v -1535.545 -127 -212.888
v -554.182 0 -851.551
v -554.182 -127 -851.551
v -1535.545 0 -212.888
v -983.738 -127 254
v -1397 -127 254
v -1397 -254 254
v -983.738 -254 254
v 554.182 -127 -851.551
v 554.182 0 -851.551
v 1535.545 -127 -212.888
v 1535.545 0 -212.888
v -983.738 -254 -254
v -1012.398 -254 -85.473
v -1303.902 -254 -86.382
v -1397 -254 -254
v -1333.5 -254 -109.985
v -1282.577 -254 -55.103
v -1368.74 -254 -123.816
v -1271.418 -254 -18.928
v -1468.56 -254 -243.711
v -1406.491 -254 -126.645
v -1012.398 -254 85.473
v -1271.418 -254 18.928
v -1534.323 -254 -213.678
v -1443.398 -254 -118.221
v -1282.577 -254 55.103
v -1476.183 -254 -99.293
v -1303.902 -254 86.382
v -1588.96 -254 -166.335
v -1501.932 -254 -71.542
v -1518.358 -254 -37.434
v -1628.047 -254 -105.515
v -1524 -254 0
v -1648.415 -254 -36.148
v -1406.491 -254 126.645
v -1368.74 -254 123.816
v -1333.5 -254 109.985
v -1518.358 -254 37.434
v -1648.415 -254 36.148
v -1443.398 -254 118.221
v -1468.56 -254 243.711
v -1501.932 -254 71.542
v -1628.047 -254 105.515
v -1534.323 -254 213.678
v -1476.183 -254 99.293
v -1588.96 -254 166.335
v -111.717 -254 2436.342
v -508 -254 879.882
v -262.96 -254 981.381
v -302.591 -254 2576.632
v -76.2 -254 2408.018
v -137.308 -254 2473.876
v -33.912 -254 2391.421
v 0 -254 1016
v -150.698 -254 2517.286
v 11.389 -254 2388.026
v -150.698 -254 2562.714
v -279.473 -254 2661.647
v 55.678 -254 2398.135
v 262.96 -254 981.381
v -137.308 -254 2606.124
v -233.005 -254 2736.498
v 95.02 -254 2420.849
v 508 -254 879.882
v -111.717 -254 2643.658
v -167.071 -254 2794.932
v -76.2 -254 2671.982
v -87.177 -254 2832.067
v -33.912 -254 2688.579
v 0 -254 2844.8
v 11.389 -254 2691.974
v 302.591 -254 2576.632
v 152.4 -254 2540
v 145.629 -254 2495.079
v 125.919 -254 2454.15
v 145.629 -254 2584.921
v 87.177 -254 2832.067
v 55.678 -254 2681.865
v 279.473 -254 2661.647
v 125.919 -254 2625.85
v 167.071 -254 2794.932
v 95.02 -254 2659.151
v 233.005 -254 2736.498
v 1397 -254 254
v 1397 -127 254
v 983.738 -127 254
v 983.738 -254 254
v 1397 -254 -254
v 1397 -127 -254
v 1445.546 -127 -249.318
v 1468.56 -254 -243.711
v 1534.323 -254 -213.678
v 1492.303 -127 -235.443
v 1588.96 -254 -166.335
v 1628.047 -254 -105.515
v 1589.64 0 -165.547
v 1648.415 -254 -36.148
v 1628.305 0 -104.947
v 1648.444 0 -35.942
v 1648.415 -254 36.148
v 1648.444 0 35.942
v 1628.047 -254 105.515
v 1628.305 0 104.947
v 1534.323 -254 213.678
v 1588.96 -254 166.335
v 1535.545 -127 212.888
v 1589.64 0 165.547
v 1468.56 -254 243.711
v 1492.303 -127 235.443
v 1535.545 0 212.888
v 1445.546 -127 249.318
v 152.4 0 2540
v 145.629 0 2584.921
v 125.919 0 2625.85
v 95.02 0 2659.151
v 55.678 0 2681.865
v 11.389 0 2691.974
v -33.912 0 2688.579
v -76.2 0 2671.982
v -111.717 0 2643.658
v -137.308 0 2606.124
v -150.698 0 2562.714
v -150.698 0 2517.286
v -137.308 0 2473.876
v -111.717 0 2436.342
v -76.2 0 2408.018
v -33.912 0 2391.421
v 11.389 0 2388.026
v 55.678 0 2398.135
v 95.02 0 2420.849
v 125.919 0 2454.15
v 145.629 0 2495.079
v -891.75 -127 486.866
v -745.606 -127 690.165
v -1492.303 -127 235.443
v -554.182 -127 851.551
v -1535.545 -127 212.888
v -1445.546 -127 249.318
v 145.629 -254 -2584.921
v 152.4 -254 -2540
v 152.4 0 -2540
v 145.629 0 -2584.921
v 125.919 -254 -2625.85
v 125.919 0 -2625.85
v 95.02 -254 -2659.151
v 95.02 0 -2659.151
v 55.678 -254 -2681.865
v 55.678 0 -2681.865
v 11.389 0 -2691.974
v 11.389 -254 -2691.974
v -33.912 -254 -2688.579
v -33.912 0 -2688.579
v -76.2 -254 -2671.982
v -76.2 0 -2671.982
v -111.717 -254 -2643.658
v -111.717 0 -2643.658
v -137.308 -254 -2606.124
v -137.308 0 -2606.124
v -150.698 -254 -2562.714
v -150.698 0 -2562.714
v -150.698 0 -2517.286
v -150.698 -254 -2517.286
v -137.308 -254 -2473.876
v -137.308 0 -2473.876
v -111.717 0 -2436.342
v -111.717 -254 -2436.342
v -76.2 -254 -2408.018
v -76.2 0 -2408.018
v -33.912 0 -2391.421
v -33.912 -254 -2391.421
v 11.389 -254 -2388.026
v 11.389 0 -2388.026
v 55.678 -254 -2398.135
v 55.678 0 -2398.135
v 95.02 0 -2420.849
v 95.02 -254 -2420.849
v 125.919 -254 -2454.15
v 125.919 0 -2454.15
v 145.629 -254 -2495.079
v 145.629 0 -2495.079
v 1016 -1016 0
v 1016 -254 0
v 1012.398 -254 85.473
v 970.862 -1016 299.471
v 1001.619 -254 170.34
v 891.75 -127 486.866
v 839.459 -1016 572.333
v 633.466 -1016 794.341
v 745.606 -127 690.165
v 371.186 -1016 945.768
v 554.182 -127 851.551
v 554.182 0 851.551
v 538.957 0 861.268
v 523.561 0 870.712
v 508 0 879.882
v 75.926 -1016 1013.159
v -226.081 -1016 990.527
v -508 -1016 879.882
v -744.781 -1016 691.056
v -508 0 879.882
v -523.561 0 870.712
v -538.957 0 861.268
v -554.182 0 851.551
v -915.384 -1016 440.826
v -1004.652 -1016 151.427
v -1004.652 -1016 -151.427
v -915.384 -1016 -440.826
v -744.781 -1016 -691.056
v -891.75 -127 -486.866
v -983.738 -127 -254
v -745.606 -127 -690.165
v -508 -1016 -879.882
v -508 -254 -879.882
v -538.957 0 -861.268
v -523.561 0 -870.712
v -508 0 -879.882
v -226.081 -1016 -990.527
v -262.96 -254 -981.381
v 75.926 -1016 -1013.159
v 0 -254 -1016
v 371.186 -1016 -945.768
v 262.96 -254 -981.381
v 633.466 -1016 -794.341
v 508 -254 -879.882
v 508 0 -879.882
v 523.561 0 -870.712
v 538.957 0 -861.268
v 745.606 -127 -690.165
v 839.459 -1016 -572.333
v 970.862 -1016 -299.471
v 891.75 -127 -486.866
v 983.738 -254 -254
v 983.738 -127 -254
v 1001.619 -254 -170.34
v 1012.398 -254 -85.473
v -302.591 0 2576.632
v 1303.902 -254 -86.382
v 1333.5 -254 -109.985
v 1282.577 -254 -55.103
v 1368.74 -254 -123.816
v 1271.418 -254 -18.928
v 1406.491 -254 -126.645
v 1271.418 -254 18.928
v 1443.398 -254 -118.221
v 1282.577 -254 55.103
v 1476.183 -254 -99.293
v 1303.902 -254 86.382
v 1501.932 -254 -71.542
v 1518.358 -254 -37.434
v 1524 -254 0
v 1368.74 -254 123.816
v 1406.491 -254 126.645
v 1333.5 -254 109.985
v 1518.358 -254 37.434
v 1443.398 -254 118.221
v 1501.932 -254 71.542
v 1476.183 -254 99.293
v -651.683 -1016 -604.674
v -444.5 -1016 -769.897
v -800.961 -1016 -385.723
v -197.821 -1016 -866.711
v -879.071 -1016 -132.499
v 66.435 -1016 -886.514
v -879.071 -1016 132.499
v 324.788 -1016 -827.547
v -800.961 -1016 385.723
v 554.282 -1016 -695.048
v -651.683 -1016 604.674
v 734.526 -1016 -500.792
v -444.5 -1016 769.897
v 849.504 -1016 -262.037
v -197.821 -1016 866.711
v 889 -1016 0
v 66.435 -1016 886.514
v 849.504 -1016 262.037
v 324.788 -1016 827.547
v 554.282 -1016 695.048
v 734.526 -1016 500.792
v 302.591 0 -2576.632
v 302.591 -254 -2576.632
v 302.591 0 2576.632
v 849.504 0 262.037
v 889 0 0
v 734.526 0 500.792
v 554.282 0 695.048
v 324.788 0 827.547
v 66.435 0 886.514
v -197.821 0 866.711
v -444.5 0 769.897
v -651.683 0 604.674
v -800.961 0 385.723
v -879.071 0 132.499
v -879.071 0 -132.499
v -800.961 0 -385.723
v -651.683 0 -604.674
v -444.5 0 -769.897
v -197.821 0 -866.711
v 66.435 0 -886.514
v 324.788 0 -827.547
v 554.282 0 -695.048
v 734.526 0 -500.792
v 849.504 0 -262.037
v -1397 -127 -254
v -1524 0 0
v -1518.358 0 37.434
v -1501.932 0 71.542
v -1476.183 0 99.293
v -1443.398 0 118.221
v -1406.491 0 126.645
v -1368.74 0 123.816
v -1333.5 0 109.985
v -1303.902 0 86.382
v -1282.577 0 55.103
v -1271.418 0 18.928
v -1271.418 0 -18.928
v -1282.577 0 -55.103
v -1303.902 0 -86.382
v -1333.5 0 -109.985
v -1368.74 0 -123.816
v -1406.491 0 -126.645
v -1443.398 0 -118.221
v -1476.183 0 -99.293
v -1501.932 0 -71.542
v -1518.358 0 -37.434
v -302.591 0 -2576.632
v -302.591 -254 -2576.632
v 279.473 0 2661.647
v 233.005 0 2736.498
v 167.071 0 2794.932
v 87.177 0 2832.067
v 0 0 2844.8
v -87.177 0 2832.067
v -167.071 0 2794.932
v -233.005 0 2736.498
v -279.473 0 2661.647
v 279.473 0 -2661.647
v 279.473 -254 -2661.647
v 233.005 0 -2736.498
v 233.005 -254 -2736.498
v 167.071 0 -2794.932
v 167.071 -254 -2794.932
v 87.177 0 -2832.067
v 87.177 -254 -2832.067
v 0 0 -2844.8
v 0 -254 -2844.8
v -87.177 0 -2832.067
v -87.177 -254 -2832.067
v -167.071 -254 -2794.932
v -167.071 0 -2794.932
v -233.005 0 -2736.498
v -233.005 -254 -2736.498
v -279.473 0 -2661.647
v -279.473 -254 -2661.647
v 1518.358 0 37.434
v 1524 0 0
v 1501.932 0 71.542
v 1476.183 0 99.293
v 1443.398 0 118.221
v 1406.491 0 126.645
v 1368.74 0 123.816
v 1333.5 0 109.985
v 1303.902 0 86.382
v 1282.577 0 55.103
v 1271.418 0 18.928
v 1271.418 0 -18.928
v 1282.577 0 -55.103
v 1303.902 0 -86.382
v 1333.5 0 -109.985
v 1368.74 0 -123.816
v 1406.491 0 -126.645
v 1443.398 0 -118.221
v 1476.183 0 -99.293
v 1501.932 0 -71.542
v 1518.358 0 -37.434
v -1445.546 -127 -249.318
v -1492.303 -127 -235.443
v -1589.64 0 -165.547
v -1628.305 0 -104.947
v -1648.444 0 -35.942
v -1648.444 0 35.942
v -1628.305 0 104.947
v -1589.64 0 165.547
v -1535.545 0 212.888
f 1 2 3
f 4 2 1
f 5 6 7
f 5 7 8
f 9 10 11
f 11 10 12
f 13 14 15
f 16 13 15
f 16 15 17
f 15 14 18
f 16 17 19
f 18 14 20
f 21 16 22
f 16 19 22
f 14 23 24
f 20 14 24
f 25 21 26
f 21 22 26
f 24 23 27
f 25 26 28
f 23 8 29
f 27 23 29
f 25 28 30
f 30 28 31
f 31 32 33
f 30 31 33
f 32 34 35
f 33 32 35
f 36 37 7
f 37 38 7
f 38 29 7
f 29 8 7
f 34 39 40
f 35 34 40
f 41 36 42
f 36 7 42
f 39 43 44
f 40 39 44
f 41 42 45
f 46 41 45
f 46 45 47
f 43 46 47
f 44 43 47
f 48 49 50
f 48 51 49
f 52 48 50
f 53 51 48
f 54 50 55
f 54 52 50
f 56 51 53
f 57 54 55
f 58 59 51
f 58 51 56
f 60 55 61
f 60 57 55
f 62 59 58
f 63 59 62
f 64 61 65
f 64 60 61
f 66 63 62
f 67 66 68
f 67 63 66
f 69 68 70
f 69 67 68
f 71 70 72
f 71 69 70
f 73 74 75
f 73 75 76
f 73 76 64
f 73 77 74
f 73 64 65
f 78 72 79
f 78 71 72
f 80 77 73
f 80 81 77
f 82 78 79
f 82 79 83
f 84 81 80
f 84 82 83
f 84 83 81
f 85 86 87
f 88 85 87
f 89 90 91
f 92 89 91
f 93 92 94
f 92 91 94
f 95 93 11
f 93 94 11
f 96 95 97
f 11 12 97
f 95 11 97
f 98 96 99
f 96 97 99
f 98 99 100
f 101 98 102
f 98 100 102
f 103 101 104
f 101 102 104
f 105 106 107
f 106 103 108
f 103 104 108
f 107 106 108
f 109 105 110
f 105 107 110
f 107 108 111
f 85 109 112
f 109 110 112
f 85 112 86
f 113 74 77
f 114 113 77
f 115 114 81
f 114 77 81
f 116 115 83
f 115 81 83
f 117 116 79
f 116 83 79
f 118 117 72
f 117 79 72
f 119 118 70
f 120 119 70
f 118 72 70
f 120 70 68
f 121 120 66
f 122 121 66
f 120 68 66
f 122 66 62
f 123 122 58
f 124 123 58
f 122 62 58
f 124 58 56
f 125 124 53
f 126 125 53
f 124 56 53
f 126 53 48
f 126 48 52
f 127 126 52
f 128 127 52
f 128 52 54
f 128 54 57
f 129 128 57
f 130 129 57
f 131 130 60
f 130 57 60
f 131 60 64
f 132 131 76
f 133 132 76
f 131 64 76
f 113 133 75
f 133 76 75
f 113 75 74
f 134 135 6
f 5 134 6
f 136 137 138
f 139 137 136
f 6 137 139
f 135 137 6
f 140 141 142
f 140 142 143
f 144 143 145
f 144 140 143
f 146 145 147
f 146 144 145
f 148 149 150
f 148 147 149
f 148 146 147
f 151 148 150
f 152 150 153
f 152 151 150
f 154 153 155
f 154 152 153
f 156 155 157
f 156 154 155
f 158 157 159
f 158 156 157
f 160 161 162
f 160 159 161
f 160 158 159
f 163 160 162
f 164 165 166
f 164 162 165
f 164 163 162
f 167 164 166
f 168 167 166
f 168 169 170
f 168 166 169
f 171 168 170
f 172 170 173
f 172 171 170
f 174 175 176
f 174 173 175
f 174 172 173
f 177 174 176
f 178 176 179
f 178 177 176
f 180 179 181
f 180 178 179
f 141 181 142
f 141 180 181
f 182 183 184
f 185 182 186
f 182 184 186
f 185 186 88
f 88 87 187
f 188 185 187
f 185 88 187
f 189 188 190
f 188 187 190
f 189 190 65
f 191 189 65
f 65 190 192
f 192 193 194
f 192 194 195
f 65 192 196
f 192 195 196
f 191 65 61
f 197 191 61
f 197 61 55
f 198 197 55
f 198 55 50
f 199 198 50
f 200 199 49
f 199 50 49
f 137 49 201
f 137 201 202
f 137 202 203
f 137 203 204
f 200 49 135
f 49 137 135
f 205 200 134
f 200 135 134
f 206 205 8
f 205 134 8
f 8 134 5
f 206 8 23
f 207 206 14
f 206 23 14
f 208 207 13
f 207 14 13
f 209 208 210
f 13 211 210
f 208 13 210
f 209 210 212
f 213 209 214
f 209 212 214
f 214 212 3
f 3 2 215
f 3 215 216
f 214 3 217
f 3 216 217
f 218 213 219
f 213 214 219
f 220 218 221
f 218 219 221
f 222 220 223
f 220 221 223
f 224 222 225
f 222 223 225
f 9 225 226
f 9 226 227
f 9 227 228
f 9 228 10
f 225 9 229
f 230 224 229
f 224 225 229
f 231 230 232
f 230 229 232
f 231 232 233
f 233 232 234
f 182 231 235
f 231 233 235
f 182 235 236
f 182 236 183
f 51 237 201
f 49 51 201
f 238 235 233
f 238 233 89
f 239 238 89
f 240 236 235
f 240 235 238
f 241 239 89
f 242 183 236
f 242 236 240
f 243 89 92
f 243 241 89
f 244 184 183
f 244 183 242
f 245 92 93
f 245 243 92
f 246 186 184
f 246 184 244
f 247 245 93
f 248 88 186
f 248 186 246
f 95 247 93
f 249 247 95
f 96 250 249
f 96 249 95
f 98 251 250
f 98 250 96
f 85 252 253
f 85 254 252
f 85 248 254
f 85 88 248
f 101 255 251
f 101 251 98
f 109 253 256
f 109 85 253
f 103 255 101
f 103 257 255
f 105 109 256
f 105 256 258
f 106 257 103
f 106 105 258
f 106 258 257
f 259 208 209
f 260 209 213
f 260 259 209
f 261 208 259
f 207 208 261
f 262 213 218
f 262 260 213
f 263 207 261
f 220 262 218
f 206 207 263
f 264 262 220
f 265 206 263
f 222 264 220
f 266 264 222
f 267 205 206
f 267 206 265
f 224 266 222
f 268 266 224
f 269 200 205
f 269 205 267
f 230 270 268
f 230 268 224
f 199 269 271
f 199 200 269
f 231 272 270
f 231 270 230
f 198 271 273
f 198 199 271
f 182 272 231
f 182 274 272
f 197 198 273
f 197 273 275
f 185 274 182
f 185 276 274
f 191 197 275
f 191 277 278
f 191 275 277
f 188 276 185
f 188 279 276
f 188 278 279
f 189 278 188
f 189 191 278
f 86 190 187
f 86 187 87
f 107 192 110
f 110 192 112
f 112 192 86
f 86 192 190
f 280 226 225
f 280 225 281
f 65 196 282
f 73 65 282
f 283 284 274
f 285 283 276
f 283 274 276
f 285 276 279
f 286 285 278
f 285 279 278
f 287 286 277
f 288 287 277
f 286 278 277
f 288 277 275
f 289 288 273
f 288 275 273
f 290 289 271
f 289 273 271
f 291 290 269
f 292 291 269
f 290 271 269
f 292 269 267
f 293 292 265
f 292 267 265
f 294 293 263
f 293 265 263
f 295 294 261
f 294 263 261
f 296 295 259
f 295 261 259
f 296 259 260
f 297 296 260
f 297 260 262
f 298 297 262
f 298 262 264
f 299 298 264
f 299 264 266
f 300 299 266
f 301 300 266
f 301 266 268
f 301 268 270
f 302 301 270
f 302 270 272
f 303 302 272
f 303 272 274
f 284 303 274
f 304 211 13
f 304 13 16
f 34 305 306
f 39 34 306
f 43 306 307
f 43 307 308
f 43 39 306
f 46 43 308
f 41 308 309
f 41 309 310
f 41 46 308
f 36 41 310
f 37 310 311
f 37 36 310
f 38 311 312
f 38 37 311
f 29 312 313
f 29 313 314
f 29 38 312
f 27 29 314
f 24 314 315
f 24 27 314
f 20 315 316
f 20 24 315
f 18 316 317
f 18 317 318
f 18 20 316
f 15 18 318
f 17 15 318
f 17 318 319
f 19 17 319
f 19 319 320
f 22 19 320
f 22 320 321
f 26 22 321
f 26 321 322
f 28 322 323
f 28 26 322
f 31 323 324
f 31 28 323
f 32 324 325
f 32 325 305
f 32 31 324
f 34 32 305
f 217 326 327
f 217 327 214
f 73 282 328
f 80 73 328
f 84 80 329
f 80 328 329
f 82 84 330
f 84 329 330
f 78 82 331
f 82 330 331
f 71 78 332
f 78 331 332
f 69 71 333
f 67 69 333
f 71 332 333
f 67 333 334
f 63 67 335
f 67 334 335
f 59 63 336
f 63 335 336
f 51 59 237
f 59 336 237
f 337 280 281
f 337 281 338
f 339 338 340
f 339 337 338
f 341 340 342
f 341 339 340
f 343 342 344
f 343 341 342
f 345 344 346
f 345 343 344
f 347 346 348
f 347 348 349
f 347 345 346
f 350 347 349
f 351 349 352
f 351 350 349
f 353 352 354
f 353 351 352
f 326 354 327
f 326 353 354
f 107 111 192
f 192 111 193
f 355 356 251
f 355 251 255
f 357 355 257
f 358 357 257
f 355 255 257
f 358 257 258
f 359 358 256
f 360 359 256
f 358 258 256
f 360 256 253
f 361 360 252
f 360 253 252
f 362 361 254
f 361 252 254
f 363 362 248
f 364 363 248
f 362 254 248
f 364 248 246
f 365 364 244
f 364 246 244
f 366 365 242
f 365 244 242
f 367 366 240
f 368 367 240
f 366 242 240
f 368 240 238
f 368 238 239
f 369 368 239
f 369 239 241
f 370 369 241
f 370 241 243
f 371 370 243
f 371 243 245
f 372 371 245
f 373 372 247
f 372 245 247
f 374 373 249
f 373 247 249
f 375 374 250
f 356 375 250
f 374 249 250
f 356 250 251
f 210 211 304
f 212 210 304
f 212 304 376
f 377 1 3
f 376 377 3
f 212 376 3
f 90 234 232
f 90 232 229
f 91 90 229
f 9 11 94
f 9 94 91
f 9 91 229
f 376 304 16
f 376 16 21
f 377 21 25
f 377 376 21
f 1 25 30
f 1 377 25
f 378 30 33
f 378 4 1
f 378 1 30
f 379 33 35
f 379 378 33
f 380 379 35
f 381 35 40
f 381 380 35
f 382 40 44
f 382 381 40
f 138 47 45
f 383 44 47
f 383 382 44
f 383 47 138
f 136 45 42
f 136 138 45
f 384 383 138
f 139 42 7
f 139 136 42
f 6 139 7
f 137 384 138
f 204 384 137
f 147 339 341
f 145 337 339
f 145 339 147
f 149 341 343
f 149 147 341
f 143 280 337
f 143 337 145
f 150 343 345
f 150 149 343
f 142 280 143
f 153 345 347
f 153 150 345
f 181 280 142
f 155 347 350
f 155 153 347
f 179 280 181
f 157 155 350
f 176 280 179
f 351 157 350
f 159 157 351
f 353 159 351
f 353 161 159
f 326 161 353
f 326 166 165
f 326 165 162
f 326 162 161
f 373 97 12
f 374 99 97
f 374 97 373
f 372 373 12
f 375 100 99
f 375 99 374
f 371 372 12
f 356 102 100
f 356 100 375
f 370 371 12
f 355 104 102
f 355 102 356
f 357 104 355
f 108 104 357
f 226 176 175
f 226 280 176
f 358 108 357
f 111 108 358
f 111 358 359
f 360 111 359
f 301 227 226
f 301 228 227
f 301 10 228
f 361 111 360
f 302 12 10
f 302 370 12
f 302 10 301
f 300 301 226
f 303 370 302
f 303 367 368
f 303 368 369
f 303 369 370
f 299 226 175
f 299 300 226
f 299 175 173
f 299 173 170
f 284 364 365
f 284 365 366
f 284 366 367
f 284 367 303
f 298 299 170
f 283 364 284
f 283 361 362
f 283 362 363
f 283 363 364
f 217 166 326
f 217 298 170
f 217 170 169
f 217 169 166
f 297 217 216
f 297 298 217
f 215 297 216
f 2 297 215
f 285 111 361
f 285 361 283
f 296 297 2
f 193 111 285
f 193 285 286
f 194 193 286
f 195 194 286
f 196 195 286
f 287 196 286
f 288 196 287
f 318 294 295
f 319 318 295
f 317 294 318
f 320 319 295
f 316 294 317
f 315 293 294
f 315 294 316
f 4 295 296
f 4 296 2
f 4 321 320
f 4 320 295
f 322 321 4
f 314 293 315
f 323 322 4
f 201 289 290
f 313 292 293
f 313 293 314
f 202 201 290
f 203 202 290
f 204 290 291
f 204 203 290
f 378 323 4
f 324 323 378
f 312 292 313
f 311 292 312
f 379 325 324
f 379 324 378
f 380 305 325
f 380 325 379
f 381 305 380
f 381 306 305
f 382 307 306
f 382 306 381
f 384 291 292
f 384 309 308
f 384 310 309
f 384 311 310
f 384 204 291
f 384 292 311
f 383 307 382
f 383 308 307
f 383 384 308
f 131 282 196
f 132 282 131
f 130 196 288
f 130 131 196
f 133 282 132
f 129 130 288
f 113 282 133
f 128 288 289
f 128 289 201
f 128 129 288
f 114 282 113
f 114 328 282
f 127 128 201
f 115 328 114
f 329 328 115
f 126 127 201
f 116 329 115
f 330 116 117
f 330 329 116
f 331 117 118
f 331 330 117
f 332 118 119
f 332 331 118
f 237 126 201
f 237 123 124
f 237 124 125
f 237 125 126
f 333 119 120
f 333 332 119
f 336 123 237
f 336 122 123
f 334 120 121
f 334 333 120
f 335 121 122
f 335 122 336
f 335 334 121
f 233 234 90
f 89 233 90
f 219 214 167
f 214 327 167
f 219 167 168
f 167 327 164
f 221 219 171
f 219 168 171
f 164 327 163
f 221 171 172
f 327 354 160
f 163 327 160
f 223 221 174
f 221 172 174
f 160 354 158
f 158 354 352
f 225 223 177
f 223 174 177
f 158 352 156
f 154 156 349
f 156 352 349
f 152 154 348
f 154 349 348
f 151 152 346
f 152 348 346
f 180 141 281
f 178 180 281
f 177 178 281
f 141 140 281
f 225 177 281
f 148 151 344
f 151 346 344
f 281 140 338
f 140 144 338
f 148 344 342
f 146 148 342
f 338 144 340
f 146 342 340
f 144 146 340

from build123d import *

# Parameters (mm, degrees)
F0_R      = 1016
F1_DEPTH  = 1016
F3_DEPTH  = 254
F4_R      = 152.4
F5_DEPTH  = 254.001
F7_R      = 127
F8_DEPTH  = 254
F10_DEPTH = 127
F11_R     = 127
F12_DEPTH = 127.001
F14_R     = 889
F15_DEPTH = 1016.001


with BuildPart() as f1:
    # F0 (on Front) → F1 (new body)
    with BuildSketch(Plane.XZ):
        Circle(F0_R)
    extrude(amount=F1_DEPTH)

    # F2 (on Front) → F3 (join)
    with BuildSketch(Plane.XZ):
        with BuildLine():
            Line((508, 879.88181), (302.590737, 2576.631762))
            ThreePointArc((302.590737, 2576.631762), (0, 2844.8), (-302.590737, 2576.631762))
            Line((-302.590737, 2576.631762), (-508, 879.88181))
            Line((-508, 879.88181), (508, 879.88181))
        make_face()
    extrude(amount=F3_DEPTH)

    # F4 (on face) → F5 (cut, through all)
    with BuildSketch(Plane.XZ.offset(254)):
        with Locations((0, 2540)):
            Circle(F4_R)
    extrude(amount=-F5_DEPTH, mode=Mode.SUBTRACT)

    # F6: F1 across plane


with BuildPart() as f1_1:
    add(f1.part)
    add(f1.part.mirror(Plane.XY))

    # F7 (on Front) → F8 (join)
    with BuildSketch(Plane.XZ):
        with BuildLine():
            Line((983.73777, -254), (1397, -254))
            ThreePointArc((1397, -254), (1651, 0), (1397, 254))
            Line((1397, 254), (983.73777, 254))
            Line((983.73777, 254), (983.73777, -254))
        make_face()
        with Locations((1397, 0)):
            Circle(F7_R, mode=Mode.SUBTRACT)
    extrude(amount=F8_DEPTH)

    # F9 (on Front) → F10 (join)
    with BuildSketch(Plane.XZ):
        Polygon((1535.545455, 212.887663), (554.181818, 851.550652), (554.181818, -851.550652), (1535.545455, -212.887663), align=None)
    extrude(amount=F10_DEPTH)

    # F11 (on face) → F12 (cut, through all)
    with BuildSketch(Plane.XZ.offset(127)):
        with Locations((1397, 0)):
            Circle(F11_R)
    extrude(amount=-F12_DEPTH, mode=Mode.SUBTRACT)

    # F13: F1 across plane


with BuildPart() as f1_2:
    add(f1_1.part)
    add(f1_1.part.mirror(Plane.YZ))

    # F14 (on face) → F15 (cut, through all)
    with BuildSketch(Plane.XZ.offset(1016)):
        Circle(F14_R)
    extrude(amount=-F15_DEPTH, mode=Mode.SUBTRACT)


solid = f1_2.part
